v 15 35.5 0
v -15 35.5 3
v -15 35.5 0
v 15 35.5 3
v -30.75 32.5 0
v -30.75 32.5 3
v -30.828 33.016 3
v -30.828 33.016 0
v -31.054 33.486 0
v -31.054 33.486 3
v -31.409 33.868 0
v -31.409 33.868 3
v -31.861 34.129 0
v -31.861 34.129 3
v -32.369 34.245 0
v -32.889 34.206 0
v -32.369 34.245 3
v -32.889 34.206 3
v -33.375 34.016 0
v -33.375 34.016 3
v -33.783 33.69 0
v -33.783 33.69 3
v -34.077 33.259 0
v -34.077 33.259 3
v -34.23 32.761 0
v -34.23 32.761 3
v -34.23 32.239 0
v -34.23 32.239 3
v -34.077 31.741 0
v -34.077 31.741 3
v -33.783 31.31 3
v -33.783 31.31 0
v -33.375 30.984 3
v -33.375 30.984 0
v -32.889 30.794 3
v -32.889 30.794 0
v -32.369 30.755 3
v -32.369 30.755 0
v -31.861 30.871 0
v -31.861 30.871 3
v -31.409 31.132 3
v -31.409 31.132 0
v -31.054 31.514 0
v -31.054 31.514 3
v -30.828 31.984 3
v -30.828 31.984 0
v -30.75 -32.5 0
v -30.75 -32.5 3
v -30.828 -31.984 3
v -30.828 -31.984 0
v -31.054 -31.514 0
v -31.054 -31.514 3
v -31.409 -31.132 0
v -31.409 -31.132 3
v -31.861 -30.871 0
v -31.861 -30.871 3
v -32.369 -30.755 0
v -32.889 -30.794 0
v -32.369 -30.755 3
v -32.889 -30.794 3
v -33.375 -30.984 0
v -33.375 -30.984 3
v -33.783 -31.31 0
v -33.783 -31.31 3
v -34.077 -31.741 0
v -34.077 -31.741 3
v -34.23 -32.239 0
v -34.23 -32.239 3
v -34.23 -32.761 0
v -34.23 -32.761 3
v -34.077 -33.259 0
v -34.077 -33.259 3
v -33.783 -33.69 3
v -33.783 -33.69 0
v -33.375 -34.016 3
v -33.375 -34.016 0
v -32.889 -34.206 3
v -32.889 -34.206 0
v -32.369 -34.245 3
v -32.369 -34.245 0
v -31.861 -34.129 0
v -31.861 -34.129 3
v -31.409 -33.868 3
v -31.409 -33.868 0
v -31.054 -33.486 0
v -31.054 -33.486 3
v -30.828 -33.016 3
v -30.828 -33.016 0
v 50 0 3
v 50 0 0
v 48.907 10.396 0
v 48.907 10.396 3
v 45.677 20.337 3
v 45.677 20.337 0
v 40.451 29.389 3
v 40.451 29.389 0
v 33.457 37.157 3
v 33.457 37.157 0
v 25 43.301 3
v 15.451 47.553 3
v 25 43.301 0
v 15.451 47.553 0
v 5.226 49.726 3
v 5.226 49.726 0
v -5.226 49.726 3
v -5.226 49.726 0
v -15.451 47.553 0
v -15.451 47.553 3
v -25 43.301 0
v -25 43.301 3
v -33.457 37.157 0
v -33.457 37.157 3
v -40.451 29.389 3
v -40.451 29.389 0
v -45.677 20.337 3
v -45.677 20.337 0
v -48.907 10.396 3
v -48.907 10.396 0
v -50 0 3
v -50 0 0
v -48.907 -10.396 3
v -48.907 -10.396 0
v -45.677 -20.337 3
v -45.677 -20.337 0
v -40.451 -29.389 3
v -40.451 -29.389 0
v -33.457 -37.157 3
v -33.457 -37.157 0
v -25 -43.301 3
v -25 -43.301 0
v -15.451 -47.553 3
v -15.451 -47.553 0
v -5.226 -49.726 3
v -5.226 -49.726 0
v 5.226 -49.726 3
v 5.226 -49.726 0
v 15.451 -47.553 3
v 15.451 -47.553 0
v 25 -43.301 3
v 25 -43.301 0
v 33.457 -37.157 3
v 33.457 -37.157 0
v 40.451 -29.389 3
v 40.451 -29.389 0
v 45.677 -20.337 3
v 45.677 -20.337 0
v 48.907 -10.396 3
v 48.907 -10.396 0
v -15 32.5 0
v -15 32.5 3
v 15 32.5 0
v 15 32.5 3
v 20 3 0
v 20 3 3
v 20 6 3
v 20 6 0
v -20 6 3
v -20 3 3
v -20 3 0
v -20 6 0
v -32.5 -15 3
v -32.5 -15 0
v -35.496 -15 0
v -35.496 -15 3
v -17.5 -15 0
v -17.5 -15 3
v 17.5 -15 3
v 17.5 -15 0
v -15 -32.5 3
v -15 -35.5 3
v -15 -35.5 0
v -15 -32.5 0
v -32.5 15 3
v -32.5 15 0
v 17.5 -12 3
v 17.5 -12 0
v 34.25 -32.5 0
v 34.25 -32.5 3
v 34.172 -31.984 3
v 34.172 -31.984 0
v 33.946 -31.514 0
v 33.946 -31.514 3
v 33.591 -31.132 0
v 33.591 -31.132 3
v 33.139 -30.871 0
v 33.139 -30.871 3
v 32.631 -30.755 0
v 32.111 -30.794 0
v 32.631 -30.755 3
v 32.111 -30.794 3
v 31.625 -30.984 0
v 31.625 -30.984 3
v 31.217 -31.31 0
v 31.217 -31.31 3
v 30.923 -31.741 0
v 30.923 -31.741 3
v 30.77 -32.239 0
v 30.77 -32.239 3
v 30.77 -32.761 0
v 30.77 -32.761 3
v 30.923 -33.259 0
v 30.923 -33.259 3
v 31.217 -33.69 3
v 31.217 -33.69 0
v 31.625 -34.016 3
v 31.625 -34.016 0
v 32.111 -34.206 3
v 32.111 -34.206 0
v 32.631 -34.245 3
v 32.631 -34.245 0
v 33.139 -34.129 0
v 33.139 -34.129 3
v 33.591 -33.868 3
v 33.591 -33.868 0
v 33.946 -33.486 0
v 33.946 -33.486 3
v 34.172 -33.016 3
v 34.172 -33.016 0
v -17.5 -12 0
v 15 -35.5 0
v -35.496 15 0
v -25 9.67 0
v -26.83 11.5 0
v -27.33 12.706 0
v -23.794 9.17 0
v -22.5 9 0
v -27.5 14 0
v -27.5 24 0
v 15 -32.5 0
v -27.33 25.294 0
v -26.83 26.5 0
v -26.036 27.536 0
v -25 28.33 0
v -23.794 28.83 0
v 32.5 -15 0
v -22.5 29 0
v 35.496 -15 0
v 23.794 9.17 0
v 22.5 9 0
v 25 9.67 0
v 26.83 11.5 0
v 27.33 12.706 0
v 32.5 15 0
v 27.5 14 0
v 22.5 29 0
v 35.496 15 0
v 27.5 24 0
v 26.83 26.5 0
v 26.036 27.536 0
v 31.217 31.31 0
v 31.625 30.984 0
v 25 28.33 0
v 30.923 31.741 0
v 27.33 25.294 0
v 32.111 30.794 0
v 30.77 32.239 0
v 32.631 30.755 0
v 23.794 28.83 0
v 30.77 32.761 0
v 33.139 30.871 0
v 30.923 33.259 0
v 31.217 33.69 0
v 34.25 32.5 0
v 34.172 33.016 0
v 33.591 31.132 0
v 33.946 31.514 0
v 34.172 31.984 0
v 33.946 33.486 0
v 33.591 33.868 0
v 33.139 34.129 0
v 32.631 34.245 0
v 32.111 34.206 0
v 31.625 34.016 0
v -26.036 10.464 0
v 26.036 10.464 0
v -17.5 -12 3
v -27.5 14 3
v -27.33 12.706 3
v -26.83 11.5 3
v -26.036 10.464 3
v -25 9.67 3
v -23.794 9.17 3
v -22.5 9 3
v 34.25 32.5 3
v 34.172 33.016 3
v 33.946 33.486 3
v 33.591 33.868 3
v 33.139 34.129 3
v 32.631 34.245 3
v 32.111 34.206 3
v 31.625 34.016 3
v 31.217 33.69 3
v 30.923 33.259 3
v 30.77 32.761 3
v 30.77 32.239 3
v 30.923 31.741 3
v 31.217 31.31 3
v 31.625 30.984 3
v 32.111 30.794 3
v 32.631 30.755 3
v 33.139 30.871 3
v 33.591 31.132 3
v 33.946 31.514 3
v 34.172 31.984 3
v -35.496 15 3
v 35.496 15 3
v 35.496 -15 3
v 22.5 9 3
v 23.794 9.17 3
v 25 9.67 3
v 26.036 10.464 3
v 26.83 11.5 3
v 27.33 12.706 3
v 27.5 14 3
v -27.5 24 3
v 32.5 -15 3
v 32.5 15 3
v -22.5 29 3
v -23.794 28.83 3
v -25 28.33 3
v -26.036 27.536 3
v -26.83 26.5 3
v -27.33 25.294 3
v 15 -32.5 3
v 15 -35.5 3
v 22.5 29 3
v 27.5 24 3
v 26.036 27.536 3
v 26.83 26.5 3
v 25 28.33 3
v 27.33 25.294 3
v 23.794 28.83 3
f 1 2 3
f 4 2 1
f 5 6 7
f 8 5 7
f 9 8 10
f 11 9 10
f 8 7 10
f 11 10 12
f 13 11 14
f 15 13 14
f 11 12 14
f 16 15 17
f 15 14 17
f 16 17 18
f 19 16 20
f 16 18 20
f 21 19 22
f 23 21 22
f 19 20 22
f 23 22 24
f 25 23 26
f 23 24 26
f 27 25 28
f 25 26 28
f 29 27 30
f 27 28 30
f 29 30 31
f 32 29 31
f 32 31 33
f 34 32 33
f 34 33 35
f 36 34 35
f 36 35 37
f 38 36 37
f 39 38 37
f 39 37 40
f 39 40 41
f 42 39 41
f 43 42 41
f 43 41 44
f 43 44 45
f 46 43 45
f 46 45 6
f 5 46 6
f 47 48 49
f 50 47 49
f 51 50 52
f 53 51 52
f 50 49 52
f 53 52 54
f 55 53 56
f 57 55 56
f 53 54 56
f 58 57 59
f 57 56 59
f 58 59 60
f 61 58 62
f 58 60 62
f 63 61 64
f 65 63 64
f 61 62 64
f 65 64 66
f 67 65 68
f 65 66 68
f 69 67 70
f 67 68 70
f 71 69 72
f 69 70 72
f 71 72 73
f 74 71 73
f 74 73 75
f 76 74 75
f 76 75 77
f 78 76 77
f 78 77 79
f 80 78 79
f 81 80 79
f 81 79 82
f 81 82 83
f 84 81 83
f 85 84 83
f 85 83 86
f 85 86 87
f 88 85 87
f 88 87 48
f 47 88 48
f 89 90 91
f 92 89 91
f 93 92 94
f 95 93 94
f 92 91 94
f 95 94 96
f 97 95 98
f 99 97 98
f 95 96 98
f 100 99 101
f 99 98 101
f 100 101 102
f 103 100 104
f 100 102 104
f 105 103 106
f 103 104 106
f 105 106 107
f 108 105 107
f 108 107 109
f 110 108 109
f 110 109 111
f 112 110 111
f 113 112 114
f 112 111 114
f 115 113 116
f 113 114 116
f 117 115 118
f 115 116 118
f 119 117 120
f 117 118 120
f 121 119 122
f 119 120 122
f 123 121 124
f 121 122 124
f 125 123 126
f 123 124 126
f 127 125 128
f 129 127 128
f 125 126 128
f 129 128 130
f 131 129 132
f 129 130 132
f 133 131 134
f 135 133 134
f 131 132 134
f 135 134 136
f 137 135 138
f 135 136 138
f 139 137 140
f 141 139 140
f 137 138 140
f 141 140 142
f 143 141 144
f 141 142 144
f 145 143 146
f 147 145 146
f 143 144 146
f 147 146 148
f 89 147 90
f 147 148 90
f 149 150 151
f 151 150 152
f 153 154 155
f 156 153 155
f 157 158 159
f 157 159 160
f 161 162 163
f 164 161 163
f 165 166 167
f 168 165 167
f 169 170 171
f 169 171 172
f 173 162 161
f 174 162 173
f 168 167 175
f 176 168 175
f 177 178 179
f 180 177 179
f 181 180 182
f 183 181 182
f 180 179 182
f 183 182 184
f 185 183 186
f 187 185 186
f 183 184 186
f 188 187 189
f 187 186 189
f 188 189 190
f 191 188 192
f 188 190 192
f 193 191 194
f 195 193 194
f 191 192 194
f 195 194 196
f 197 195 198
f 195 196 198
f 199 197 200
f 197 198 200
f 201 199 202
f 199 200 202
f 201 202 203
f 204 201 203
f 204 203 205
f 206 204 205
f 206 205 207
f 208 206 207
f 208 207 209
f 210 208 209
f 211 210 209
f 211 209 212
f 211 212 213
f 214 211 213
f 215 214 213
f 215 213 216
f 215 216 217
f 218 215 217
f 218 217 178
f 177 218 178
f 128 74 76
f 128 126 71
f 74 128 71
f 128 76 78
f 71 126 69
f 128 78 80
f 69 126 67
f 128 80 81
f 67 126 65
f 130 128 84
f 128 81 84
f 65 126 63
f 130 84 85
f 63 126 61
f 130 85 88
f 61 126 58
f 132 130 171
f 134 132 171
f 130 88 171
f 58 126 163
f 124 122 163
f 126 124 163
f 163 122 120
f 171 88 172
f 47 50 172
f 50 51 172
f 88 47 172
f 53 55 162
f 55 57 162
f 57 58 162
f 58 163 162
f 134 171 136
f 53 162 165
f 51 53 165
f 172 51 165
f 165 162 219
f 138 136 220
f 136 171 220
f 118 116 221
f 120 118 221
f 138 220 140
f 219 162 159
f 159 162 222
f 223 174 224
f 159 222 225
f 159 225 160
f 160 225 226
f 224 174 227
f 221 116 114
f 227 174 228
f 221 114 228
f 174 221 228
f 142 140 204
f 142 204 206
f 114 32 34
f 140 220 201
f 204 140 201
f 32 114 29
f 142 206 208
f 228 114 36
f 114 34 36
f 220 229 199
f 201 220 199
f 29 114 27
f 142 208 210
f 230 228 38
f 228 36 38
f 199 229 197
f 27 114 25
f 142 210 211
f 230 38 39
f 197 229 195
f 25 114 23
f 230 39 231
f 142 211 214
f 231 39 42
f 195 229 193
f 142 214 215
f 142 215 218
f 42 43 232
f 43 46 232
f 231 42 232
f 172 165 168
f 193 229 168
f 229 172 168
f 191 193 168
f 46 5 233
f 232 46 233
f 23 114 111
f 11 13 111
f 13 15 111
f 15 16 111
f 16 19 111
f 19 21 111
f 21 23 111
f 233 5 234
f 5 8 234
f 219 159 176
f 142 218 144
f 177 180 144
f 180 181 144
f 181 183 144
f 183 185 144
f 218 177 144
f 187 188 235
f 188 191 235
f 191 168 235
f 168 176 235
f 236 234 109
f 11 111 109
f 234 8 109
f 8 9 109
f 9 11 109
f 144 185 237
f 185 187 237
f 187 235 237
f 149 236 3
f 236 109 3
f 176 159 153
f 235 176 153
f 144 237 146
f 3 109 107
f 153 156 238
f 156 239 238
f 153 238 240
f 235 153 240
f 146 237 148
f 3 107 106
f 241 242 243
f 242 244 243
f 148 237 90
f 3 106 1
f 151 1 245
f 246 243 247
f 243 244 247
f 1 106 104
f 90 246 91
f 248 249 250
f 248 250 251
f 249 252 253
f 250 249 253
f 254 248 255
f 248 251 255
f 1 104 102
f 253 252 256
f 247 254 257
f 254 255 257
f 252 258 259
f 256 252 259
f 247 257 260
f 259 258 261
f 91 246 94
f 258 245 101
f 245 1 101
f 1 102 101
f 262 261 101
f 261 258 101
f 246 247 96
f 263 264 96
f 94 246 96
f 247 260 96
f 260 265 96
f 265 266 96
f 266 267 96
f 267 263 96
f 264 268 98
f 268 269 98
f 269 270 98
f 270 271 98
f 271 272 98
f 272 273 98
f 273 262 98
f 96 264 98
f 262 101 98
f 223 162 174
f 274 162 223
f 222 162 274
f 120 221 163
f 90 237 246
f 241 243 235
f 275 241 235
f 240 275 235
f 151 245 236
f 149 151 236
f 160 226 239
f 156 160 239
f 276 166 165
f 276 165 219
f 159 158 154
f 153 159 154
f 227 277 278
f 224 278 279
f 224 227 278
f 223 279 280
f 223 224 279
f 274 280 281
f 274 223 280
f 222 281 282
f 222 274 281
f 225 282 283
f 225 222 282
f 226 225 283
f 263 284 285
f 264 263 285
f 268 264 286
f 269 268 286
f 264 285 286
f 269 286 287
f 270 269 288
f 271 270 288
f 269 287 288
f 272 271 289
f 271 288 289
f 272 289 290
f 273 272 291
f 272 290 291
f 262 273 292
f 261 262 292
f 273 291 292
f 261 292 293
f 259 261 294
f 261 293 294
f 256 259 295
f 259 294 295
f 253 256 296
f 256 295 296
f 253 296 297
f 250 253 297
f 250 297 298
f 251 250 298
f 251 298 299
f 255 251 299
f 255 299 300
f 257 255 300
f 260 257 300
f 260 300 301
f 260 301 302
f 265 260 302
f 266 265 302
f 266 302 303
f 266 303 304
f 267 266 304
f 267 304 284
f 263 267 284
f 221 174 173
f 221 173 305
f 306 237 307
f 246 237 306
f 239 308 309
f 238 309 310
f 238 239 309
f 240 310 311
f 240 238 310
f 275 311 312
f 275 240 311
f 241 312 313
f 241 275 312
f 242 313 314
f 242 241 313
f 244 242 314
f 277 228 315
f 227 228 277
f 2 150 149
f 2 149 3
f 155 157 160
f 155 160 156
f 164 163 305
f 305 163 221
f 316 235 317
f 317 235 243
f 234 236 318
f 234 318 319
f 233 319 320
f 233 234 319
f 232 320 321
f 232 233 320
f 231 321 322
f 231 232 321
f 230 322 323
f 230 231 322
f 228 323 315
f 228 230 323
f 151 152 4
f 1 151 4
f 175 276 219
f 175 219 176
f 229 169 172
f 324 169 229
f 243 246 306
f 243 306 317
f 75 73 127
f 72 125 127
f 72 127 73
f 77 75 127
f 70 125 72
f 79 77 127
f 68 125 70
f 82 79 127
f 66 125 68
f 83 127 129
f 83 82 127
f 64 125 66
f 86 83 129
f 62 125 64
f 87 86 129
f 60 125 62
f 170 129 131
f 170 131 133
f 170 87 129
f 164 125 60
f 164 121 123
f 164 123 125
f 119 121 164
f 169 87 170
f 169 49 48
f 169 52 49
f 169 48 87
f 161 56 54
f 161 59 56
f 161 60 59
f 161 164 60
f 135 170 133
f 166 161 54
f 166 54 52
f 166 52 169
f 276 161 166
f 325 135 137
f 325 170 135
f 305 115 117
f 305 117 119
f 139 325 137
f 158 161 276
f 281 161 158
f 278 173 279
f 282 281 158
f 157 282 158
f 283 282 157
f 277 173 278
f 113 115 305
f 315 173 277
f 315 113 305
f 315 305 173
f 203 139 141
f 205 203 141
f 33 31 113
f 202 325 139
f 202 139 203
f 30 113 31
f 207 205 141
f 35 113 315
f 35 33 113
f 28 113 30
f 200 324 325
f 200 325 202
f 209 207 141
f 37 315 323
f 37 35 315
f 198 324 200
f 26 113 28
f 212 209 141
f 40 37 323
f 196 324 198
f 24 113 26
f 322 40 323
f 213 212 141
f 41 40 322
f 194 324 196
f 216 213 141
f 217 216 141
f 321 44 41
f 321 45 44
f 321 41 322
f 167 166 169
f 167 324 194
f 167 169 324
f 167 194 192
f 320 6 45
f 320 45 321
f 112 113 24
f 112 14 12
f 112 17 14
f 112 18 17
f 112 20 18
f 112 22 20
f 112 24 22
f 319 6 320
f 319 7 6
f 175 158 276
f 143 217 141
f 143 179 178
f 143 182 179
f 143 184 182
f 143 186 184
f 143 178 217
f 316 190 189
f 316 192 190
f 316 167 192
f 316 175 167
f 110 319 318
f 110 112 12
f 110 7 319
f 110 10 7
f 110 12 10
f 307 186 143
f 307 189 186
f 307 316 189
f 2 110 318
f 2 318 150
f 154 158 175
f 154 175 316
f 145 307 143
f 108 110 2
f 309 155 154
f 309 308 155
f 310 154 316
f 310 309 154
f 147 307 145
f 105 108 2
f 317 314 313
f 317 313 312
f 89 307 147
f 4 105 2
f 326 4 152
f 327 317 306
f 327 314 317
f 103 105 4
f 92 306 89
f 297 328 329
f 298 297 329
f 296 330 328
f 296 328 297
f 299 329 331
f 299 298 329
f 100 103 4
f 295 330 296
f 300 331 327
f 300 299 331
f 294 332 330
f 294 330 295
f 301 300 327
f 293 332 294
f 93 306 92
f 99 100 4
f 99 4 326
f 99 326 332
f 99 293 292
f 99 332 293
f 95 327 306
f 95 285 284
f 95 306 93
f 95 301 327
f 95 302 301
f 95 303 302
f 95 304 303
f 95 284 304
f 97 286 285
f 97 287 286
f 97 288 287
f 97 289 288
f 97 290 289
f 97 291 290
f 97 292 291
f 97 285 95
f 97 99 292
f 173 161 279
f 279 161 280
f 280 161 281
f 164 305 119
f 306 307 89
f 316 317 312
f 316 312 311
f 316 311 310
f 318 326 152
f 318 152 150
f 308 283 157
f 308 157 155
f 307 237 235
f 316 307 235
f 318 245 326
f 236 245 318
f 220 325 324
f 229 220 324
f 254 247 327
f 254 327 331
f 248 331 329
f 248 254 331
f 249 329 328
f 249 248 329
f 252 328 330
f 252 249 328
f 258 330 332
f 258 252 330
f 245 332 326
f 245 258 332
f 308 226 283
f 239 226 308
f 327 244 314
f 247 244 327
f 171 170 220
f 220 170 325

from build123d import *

# Parameters (mm, degrees)
SKETCH_1_R          = 50
EXTRUDE_1_DEPTH     = 3
SKETCH_2_W          = 30
SKETCH_2_H          = 3
SKETCH_2_W_2        = 35
SKETCH_2_W_3        = 40
CUT_EXTRUDE_1_DEPTH = 8
CUT_EXTRUDE_2_DEPTH = 10
SKETCH_4_W          = 2.995674625
SKETCH_4_H          = 30
CUT_EXTRUDE_3_DEPTH = 10
SKETCH_5_R          = 1.75
CUT_EXTRUDE_4_DEPTH = 10


with BuildPart() as part:
    # Эскиз1 → Бобышка-Вытянуть1 (new body)
    with BuildSketch(Plane.XY):
        Circle(SKETCH_1_R)
    extrude(amount=EXTRUDE_1_DEPTH)

    # Эскиз2 → Вырез-Вытянуть1 (cut)
    with BuildSketch(Plane.XY.offset(3)):
        with Locations((0, -34)):
            Rectangle(SKETCH_2_W, SKETCH_2_H)
        with Locations((0, -13.5)):
            Rectangle(SKETCH_2_W_2, SKETCH_2_H)
        with Locations((0, 4.5)):
            Rectangle(SKETCH_2_W_3, SKETCH_2_H)
        with Locations((0, 34)):
            Rectangle(SKETCH_2_W, SKETCH_2_H)
    extrude(amount=-CUT_EXTRUDE_1_DEPTH, mode=Mode.SUBTRACT)

    # Эскиз3 → Вырез-Вытянуть2 (cut)
    with BuildSketch(Plane(origin=(0, 0, 0), x_dir=(-1, 0, 0), z_dir=(0, 0, -1))):
        with BuildLine():
            Line((-22.5, 29), (22.5, 29))
            ThreePointArc((22.5, 29), (26.035533906, 27.535533906), (27.5, 24))
            Line((27.5, 24), (27.5, 14))
            ThreePointArc((27.5, 14), (26.035533906, 10.464466094), (22.5, 9))
            Line((22.5, 9), (-22.5, 9))
            ThreePointArc((-22.5, 9), (-26.035533906, 10.464466094), (-27.5, 14))
            Line((-27.5, 14), (-27.5, 24))
            ThreePointArc((-27.5, 24), (-26.035533906, 27.535533906), (-22.5, 29))
        make_face()
    extrude(amount=-CUT_EXTRUDE_2_DEPTH, mode=Mode.SUBTRACT)

    # Эскиз4 → Вырез-Вытянуть3 (cut)
    with BuildSketch(Plane(origin=(0, 0, 0), x_dir=(-1, 0, 0), z_dir=(0, 0, -1))):
        with Locations((-33.997837312, 0)):
            Rectangle(SKETCH_4_W, SKETCH_4_H)
        with Locations((33.997837312, 0)):
            Rectangle(SKETCH_4_W, SKETCH_4_H)
    extrude(amount=-CUT_EXTRUDE_3_DEPTH, mode=Mode.SUBTRACT)

    # Эскиз5 → Вырез-Вытянуть4 (cut)
    with BuildSketch(Plane.XY.offset(3)):
        with Locations((-32.5, 32.5)):
            Circle(SKETCH_5_R)
        with Locations((32.5, 32.5)):
            Circle(SKETCH_5_R)
        with Locations((32.5, -32.5)):
            Circle(SKETCH_5_R)
        with Locations((-32.5, -32.5)):
            Circle(SKETCH_5_R)
    extrude(amount=-CUT_EXTRUDE_4_DEPTH, mode=Mode.SUBTRACT)


solid = part.part
